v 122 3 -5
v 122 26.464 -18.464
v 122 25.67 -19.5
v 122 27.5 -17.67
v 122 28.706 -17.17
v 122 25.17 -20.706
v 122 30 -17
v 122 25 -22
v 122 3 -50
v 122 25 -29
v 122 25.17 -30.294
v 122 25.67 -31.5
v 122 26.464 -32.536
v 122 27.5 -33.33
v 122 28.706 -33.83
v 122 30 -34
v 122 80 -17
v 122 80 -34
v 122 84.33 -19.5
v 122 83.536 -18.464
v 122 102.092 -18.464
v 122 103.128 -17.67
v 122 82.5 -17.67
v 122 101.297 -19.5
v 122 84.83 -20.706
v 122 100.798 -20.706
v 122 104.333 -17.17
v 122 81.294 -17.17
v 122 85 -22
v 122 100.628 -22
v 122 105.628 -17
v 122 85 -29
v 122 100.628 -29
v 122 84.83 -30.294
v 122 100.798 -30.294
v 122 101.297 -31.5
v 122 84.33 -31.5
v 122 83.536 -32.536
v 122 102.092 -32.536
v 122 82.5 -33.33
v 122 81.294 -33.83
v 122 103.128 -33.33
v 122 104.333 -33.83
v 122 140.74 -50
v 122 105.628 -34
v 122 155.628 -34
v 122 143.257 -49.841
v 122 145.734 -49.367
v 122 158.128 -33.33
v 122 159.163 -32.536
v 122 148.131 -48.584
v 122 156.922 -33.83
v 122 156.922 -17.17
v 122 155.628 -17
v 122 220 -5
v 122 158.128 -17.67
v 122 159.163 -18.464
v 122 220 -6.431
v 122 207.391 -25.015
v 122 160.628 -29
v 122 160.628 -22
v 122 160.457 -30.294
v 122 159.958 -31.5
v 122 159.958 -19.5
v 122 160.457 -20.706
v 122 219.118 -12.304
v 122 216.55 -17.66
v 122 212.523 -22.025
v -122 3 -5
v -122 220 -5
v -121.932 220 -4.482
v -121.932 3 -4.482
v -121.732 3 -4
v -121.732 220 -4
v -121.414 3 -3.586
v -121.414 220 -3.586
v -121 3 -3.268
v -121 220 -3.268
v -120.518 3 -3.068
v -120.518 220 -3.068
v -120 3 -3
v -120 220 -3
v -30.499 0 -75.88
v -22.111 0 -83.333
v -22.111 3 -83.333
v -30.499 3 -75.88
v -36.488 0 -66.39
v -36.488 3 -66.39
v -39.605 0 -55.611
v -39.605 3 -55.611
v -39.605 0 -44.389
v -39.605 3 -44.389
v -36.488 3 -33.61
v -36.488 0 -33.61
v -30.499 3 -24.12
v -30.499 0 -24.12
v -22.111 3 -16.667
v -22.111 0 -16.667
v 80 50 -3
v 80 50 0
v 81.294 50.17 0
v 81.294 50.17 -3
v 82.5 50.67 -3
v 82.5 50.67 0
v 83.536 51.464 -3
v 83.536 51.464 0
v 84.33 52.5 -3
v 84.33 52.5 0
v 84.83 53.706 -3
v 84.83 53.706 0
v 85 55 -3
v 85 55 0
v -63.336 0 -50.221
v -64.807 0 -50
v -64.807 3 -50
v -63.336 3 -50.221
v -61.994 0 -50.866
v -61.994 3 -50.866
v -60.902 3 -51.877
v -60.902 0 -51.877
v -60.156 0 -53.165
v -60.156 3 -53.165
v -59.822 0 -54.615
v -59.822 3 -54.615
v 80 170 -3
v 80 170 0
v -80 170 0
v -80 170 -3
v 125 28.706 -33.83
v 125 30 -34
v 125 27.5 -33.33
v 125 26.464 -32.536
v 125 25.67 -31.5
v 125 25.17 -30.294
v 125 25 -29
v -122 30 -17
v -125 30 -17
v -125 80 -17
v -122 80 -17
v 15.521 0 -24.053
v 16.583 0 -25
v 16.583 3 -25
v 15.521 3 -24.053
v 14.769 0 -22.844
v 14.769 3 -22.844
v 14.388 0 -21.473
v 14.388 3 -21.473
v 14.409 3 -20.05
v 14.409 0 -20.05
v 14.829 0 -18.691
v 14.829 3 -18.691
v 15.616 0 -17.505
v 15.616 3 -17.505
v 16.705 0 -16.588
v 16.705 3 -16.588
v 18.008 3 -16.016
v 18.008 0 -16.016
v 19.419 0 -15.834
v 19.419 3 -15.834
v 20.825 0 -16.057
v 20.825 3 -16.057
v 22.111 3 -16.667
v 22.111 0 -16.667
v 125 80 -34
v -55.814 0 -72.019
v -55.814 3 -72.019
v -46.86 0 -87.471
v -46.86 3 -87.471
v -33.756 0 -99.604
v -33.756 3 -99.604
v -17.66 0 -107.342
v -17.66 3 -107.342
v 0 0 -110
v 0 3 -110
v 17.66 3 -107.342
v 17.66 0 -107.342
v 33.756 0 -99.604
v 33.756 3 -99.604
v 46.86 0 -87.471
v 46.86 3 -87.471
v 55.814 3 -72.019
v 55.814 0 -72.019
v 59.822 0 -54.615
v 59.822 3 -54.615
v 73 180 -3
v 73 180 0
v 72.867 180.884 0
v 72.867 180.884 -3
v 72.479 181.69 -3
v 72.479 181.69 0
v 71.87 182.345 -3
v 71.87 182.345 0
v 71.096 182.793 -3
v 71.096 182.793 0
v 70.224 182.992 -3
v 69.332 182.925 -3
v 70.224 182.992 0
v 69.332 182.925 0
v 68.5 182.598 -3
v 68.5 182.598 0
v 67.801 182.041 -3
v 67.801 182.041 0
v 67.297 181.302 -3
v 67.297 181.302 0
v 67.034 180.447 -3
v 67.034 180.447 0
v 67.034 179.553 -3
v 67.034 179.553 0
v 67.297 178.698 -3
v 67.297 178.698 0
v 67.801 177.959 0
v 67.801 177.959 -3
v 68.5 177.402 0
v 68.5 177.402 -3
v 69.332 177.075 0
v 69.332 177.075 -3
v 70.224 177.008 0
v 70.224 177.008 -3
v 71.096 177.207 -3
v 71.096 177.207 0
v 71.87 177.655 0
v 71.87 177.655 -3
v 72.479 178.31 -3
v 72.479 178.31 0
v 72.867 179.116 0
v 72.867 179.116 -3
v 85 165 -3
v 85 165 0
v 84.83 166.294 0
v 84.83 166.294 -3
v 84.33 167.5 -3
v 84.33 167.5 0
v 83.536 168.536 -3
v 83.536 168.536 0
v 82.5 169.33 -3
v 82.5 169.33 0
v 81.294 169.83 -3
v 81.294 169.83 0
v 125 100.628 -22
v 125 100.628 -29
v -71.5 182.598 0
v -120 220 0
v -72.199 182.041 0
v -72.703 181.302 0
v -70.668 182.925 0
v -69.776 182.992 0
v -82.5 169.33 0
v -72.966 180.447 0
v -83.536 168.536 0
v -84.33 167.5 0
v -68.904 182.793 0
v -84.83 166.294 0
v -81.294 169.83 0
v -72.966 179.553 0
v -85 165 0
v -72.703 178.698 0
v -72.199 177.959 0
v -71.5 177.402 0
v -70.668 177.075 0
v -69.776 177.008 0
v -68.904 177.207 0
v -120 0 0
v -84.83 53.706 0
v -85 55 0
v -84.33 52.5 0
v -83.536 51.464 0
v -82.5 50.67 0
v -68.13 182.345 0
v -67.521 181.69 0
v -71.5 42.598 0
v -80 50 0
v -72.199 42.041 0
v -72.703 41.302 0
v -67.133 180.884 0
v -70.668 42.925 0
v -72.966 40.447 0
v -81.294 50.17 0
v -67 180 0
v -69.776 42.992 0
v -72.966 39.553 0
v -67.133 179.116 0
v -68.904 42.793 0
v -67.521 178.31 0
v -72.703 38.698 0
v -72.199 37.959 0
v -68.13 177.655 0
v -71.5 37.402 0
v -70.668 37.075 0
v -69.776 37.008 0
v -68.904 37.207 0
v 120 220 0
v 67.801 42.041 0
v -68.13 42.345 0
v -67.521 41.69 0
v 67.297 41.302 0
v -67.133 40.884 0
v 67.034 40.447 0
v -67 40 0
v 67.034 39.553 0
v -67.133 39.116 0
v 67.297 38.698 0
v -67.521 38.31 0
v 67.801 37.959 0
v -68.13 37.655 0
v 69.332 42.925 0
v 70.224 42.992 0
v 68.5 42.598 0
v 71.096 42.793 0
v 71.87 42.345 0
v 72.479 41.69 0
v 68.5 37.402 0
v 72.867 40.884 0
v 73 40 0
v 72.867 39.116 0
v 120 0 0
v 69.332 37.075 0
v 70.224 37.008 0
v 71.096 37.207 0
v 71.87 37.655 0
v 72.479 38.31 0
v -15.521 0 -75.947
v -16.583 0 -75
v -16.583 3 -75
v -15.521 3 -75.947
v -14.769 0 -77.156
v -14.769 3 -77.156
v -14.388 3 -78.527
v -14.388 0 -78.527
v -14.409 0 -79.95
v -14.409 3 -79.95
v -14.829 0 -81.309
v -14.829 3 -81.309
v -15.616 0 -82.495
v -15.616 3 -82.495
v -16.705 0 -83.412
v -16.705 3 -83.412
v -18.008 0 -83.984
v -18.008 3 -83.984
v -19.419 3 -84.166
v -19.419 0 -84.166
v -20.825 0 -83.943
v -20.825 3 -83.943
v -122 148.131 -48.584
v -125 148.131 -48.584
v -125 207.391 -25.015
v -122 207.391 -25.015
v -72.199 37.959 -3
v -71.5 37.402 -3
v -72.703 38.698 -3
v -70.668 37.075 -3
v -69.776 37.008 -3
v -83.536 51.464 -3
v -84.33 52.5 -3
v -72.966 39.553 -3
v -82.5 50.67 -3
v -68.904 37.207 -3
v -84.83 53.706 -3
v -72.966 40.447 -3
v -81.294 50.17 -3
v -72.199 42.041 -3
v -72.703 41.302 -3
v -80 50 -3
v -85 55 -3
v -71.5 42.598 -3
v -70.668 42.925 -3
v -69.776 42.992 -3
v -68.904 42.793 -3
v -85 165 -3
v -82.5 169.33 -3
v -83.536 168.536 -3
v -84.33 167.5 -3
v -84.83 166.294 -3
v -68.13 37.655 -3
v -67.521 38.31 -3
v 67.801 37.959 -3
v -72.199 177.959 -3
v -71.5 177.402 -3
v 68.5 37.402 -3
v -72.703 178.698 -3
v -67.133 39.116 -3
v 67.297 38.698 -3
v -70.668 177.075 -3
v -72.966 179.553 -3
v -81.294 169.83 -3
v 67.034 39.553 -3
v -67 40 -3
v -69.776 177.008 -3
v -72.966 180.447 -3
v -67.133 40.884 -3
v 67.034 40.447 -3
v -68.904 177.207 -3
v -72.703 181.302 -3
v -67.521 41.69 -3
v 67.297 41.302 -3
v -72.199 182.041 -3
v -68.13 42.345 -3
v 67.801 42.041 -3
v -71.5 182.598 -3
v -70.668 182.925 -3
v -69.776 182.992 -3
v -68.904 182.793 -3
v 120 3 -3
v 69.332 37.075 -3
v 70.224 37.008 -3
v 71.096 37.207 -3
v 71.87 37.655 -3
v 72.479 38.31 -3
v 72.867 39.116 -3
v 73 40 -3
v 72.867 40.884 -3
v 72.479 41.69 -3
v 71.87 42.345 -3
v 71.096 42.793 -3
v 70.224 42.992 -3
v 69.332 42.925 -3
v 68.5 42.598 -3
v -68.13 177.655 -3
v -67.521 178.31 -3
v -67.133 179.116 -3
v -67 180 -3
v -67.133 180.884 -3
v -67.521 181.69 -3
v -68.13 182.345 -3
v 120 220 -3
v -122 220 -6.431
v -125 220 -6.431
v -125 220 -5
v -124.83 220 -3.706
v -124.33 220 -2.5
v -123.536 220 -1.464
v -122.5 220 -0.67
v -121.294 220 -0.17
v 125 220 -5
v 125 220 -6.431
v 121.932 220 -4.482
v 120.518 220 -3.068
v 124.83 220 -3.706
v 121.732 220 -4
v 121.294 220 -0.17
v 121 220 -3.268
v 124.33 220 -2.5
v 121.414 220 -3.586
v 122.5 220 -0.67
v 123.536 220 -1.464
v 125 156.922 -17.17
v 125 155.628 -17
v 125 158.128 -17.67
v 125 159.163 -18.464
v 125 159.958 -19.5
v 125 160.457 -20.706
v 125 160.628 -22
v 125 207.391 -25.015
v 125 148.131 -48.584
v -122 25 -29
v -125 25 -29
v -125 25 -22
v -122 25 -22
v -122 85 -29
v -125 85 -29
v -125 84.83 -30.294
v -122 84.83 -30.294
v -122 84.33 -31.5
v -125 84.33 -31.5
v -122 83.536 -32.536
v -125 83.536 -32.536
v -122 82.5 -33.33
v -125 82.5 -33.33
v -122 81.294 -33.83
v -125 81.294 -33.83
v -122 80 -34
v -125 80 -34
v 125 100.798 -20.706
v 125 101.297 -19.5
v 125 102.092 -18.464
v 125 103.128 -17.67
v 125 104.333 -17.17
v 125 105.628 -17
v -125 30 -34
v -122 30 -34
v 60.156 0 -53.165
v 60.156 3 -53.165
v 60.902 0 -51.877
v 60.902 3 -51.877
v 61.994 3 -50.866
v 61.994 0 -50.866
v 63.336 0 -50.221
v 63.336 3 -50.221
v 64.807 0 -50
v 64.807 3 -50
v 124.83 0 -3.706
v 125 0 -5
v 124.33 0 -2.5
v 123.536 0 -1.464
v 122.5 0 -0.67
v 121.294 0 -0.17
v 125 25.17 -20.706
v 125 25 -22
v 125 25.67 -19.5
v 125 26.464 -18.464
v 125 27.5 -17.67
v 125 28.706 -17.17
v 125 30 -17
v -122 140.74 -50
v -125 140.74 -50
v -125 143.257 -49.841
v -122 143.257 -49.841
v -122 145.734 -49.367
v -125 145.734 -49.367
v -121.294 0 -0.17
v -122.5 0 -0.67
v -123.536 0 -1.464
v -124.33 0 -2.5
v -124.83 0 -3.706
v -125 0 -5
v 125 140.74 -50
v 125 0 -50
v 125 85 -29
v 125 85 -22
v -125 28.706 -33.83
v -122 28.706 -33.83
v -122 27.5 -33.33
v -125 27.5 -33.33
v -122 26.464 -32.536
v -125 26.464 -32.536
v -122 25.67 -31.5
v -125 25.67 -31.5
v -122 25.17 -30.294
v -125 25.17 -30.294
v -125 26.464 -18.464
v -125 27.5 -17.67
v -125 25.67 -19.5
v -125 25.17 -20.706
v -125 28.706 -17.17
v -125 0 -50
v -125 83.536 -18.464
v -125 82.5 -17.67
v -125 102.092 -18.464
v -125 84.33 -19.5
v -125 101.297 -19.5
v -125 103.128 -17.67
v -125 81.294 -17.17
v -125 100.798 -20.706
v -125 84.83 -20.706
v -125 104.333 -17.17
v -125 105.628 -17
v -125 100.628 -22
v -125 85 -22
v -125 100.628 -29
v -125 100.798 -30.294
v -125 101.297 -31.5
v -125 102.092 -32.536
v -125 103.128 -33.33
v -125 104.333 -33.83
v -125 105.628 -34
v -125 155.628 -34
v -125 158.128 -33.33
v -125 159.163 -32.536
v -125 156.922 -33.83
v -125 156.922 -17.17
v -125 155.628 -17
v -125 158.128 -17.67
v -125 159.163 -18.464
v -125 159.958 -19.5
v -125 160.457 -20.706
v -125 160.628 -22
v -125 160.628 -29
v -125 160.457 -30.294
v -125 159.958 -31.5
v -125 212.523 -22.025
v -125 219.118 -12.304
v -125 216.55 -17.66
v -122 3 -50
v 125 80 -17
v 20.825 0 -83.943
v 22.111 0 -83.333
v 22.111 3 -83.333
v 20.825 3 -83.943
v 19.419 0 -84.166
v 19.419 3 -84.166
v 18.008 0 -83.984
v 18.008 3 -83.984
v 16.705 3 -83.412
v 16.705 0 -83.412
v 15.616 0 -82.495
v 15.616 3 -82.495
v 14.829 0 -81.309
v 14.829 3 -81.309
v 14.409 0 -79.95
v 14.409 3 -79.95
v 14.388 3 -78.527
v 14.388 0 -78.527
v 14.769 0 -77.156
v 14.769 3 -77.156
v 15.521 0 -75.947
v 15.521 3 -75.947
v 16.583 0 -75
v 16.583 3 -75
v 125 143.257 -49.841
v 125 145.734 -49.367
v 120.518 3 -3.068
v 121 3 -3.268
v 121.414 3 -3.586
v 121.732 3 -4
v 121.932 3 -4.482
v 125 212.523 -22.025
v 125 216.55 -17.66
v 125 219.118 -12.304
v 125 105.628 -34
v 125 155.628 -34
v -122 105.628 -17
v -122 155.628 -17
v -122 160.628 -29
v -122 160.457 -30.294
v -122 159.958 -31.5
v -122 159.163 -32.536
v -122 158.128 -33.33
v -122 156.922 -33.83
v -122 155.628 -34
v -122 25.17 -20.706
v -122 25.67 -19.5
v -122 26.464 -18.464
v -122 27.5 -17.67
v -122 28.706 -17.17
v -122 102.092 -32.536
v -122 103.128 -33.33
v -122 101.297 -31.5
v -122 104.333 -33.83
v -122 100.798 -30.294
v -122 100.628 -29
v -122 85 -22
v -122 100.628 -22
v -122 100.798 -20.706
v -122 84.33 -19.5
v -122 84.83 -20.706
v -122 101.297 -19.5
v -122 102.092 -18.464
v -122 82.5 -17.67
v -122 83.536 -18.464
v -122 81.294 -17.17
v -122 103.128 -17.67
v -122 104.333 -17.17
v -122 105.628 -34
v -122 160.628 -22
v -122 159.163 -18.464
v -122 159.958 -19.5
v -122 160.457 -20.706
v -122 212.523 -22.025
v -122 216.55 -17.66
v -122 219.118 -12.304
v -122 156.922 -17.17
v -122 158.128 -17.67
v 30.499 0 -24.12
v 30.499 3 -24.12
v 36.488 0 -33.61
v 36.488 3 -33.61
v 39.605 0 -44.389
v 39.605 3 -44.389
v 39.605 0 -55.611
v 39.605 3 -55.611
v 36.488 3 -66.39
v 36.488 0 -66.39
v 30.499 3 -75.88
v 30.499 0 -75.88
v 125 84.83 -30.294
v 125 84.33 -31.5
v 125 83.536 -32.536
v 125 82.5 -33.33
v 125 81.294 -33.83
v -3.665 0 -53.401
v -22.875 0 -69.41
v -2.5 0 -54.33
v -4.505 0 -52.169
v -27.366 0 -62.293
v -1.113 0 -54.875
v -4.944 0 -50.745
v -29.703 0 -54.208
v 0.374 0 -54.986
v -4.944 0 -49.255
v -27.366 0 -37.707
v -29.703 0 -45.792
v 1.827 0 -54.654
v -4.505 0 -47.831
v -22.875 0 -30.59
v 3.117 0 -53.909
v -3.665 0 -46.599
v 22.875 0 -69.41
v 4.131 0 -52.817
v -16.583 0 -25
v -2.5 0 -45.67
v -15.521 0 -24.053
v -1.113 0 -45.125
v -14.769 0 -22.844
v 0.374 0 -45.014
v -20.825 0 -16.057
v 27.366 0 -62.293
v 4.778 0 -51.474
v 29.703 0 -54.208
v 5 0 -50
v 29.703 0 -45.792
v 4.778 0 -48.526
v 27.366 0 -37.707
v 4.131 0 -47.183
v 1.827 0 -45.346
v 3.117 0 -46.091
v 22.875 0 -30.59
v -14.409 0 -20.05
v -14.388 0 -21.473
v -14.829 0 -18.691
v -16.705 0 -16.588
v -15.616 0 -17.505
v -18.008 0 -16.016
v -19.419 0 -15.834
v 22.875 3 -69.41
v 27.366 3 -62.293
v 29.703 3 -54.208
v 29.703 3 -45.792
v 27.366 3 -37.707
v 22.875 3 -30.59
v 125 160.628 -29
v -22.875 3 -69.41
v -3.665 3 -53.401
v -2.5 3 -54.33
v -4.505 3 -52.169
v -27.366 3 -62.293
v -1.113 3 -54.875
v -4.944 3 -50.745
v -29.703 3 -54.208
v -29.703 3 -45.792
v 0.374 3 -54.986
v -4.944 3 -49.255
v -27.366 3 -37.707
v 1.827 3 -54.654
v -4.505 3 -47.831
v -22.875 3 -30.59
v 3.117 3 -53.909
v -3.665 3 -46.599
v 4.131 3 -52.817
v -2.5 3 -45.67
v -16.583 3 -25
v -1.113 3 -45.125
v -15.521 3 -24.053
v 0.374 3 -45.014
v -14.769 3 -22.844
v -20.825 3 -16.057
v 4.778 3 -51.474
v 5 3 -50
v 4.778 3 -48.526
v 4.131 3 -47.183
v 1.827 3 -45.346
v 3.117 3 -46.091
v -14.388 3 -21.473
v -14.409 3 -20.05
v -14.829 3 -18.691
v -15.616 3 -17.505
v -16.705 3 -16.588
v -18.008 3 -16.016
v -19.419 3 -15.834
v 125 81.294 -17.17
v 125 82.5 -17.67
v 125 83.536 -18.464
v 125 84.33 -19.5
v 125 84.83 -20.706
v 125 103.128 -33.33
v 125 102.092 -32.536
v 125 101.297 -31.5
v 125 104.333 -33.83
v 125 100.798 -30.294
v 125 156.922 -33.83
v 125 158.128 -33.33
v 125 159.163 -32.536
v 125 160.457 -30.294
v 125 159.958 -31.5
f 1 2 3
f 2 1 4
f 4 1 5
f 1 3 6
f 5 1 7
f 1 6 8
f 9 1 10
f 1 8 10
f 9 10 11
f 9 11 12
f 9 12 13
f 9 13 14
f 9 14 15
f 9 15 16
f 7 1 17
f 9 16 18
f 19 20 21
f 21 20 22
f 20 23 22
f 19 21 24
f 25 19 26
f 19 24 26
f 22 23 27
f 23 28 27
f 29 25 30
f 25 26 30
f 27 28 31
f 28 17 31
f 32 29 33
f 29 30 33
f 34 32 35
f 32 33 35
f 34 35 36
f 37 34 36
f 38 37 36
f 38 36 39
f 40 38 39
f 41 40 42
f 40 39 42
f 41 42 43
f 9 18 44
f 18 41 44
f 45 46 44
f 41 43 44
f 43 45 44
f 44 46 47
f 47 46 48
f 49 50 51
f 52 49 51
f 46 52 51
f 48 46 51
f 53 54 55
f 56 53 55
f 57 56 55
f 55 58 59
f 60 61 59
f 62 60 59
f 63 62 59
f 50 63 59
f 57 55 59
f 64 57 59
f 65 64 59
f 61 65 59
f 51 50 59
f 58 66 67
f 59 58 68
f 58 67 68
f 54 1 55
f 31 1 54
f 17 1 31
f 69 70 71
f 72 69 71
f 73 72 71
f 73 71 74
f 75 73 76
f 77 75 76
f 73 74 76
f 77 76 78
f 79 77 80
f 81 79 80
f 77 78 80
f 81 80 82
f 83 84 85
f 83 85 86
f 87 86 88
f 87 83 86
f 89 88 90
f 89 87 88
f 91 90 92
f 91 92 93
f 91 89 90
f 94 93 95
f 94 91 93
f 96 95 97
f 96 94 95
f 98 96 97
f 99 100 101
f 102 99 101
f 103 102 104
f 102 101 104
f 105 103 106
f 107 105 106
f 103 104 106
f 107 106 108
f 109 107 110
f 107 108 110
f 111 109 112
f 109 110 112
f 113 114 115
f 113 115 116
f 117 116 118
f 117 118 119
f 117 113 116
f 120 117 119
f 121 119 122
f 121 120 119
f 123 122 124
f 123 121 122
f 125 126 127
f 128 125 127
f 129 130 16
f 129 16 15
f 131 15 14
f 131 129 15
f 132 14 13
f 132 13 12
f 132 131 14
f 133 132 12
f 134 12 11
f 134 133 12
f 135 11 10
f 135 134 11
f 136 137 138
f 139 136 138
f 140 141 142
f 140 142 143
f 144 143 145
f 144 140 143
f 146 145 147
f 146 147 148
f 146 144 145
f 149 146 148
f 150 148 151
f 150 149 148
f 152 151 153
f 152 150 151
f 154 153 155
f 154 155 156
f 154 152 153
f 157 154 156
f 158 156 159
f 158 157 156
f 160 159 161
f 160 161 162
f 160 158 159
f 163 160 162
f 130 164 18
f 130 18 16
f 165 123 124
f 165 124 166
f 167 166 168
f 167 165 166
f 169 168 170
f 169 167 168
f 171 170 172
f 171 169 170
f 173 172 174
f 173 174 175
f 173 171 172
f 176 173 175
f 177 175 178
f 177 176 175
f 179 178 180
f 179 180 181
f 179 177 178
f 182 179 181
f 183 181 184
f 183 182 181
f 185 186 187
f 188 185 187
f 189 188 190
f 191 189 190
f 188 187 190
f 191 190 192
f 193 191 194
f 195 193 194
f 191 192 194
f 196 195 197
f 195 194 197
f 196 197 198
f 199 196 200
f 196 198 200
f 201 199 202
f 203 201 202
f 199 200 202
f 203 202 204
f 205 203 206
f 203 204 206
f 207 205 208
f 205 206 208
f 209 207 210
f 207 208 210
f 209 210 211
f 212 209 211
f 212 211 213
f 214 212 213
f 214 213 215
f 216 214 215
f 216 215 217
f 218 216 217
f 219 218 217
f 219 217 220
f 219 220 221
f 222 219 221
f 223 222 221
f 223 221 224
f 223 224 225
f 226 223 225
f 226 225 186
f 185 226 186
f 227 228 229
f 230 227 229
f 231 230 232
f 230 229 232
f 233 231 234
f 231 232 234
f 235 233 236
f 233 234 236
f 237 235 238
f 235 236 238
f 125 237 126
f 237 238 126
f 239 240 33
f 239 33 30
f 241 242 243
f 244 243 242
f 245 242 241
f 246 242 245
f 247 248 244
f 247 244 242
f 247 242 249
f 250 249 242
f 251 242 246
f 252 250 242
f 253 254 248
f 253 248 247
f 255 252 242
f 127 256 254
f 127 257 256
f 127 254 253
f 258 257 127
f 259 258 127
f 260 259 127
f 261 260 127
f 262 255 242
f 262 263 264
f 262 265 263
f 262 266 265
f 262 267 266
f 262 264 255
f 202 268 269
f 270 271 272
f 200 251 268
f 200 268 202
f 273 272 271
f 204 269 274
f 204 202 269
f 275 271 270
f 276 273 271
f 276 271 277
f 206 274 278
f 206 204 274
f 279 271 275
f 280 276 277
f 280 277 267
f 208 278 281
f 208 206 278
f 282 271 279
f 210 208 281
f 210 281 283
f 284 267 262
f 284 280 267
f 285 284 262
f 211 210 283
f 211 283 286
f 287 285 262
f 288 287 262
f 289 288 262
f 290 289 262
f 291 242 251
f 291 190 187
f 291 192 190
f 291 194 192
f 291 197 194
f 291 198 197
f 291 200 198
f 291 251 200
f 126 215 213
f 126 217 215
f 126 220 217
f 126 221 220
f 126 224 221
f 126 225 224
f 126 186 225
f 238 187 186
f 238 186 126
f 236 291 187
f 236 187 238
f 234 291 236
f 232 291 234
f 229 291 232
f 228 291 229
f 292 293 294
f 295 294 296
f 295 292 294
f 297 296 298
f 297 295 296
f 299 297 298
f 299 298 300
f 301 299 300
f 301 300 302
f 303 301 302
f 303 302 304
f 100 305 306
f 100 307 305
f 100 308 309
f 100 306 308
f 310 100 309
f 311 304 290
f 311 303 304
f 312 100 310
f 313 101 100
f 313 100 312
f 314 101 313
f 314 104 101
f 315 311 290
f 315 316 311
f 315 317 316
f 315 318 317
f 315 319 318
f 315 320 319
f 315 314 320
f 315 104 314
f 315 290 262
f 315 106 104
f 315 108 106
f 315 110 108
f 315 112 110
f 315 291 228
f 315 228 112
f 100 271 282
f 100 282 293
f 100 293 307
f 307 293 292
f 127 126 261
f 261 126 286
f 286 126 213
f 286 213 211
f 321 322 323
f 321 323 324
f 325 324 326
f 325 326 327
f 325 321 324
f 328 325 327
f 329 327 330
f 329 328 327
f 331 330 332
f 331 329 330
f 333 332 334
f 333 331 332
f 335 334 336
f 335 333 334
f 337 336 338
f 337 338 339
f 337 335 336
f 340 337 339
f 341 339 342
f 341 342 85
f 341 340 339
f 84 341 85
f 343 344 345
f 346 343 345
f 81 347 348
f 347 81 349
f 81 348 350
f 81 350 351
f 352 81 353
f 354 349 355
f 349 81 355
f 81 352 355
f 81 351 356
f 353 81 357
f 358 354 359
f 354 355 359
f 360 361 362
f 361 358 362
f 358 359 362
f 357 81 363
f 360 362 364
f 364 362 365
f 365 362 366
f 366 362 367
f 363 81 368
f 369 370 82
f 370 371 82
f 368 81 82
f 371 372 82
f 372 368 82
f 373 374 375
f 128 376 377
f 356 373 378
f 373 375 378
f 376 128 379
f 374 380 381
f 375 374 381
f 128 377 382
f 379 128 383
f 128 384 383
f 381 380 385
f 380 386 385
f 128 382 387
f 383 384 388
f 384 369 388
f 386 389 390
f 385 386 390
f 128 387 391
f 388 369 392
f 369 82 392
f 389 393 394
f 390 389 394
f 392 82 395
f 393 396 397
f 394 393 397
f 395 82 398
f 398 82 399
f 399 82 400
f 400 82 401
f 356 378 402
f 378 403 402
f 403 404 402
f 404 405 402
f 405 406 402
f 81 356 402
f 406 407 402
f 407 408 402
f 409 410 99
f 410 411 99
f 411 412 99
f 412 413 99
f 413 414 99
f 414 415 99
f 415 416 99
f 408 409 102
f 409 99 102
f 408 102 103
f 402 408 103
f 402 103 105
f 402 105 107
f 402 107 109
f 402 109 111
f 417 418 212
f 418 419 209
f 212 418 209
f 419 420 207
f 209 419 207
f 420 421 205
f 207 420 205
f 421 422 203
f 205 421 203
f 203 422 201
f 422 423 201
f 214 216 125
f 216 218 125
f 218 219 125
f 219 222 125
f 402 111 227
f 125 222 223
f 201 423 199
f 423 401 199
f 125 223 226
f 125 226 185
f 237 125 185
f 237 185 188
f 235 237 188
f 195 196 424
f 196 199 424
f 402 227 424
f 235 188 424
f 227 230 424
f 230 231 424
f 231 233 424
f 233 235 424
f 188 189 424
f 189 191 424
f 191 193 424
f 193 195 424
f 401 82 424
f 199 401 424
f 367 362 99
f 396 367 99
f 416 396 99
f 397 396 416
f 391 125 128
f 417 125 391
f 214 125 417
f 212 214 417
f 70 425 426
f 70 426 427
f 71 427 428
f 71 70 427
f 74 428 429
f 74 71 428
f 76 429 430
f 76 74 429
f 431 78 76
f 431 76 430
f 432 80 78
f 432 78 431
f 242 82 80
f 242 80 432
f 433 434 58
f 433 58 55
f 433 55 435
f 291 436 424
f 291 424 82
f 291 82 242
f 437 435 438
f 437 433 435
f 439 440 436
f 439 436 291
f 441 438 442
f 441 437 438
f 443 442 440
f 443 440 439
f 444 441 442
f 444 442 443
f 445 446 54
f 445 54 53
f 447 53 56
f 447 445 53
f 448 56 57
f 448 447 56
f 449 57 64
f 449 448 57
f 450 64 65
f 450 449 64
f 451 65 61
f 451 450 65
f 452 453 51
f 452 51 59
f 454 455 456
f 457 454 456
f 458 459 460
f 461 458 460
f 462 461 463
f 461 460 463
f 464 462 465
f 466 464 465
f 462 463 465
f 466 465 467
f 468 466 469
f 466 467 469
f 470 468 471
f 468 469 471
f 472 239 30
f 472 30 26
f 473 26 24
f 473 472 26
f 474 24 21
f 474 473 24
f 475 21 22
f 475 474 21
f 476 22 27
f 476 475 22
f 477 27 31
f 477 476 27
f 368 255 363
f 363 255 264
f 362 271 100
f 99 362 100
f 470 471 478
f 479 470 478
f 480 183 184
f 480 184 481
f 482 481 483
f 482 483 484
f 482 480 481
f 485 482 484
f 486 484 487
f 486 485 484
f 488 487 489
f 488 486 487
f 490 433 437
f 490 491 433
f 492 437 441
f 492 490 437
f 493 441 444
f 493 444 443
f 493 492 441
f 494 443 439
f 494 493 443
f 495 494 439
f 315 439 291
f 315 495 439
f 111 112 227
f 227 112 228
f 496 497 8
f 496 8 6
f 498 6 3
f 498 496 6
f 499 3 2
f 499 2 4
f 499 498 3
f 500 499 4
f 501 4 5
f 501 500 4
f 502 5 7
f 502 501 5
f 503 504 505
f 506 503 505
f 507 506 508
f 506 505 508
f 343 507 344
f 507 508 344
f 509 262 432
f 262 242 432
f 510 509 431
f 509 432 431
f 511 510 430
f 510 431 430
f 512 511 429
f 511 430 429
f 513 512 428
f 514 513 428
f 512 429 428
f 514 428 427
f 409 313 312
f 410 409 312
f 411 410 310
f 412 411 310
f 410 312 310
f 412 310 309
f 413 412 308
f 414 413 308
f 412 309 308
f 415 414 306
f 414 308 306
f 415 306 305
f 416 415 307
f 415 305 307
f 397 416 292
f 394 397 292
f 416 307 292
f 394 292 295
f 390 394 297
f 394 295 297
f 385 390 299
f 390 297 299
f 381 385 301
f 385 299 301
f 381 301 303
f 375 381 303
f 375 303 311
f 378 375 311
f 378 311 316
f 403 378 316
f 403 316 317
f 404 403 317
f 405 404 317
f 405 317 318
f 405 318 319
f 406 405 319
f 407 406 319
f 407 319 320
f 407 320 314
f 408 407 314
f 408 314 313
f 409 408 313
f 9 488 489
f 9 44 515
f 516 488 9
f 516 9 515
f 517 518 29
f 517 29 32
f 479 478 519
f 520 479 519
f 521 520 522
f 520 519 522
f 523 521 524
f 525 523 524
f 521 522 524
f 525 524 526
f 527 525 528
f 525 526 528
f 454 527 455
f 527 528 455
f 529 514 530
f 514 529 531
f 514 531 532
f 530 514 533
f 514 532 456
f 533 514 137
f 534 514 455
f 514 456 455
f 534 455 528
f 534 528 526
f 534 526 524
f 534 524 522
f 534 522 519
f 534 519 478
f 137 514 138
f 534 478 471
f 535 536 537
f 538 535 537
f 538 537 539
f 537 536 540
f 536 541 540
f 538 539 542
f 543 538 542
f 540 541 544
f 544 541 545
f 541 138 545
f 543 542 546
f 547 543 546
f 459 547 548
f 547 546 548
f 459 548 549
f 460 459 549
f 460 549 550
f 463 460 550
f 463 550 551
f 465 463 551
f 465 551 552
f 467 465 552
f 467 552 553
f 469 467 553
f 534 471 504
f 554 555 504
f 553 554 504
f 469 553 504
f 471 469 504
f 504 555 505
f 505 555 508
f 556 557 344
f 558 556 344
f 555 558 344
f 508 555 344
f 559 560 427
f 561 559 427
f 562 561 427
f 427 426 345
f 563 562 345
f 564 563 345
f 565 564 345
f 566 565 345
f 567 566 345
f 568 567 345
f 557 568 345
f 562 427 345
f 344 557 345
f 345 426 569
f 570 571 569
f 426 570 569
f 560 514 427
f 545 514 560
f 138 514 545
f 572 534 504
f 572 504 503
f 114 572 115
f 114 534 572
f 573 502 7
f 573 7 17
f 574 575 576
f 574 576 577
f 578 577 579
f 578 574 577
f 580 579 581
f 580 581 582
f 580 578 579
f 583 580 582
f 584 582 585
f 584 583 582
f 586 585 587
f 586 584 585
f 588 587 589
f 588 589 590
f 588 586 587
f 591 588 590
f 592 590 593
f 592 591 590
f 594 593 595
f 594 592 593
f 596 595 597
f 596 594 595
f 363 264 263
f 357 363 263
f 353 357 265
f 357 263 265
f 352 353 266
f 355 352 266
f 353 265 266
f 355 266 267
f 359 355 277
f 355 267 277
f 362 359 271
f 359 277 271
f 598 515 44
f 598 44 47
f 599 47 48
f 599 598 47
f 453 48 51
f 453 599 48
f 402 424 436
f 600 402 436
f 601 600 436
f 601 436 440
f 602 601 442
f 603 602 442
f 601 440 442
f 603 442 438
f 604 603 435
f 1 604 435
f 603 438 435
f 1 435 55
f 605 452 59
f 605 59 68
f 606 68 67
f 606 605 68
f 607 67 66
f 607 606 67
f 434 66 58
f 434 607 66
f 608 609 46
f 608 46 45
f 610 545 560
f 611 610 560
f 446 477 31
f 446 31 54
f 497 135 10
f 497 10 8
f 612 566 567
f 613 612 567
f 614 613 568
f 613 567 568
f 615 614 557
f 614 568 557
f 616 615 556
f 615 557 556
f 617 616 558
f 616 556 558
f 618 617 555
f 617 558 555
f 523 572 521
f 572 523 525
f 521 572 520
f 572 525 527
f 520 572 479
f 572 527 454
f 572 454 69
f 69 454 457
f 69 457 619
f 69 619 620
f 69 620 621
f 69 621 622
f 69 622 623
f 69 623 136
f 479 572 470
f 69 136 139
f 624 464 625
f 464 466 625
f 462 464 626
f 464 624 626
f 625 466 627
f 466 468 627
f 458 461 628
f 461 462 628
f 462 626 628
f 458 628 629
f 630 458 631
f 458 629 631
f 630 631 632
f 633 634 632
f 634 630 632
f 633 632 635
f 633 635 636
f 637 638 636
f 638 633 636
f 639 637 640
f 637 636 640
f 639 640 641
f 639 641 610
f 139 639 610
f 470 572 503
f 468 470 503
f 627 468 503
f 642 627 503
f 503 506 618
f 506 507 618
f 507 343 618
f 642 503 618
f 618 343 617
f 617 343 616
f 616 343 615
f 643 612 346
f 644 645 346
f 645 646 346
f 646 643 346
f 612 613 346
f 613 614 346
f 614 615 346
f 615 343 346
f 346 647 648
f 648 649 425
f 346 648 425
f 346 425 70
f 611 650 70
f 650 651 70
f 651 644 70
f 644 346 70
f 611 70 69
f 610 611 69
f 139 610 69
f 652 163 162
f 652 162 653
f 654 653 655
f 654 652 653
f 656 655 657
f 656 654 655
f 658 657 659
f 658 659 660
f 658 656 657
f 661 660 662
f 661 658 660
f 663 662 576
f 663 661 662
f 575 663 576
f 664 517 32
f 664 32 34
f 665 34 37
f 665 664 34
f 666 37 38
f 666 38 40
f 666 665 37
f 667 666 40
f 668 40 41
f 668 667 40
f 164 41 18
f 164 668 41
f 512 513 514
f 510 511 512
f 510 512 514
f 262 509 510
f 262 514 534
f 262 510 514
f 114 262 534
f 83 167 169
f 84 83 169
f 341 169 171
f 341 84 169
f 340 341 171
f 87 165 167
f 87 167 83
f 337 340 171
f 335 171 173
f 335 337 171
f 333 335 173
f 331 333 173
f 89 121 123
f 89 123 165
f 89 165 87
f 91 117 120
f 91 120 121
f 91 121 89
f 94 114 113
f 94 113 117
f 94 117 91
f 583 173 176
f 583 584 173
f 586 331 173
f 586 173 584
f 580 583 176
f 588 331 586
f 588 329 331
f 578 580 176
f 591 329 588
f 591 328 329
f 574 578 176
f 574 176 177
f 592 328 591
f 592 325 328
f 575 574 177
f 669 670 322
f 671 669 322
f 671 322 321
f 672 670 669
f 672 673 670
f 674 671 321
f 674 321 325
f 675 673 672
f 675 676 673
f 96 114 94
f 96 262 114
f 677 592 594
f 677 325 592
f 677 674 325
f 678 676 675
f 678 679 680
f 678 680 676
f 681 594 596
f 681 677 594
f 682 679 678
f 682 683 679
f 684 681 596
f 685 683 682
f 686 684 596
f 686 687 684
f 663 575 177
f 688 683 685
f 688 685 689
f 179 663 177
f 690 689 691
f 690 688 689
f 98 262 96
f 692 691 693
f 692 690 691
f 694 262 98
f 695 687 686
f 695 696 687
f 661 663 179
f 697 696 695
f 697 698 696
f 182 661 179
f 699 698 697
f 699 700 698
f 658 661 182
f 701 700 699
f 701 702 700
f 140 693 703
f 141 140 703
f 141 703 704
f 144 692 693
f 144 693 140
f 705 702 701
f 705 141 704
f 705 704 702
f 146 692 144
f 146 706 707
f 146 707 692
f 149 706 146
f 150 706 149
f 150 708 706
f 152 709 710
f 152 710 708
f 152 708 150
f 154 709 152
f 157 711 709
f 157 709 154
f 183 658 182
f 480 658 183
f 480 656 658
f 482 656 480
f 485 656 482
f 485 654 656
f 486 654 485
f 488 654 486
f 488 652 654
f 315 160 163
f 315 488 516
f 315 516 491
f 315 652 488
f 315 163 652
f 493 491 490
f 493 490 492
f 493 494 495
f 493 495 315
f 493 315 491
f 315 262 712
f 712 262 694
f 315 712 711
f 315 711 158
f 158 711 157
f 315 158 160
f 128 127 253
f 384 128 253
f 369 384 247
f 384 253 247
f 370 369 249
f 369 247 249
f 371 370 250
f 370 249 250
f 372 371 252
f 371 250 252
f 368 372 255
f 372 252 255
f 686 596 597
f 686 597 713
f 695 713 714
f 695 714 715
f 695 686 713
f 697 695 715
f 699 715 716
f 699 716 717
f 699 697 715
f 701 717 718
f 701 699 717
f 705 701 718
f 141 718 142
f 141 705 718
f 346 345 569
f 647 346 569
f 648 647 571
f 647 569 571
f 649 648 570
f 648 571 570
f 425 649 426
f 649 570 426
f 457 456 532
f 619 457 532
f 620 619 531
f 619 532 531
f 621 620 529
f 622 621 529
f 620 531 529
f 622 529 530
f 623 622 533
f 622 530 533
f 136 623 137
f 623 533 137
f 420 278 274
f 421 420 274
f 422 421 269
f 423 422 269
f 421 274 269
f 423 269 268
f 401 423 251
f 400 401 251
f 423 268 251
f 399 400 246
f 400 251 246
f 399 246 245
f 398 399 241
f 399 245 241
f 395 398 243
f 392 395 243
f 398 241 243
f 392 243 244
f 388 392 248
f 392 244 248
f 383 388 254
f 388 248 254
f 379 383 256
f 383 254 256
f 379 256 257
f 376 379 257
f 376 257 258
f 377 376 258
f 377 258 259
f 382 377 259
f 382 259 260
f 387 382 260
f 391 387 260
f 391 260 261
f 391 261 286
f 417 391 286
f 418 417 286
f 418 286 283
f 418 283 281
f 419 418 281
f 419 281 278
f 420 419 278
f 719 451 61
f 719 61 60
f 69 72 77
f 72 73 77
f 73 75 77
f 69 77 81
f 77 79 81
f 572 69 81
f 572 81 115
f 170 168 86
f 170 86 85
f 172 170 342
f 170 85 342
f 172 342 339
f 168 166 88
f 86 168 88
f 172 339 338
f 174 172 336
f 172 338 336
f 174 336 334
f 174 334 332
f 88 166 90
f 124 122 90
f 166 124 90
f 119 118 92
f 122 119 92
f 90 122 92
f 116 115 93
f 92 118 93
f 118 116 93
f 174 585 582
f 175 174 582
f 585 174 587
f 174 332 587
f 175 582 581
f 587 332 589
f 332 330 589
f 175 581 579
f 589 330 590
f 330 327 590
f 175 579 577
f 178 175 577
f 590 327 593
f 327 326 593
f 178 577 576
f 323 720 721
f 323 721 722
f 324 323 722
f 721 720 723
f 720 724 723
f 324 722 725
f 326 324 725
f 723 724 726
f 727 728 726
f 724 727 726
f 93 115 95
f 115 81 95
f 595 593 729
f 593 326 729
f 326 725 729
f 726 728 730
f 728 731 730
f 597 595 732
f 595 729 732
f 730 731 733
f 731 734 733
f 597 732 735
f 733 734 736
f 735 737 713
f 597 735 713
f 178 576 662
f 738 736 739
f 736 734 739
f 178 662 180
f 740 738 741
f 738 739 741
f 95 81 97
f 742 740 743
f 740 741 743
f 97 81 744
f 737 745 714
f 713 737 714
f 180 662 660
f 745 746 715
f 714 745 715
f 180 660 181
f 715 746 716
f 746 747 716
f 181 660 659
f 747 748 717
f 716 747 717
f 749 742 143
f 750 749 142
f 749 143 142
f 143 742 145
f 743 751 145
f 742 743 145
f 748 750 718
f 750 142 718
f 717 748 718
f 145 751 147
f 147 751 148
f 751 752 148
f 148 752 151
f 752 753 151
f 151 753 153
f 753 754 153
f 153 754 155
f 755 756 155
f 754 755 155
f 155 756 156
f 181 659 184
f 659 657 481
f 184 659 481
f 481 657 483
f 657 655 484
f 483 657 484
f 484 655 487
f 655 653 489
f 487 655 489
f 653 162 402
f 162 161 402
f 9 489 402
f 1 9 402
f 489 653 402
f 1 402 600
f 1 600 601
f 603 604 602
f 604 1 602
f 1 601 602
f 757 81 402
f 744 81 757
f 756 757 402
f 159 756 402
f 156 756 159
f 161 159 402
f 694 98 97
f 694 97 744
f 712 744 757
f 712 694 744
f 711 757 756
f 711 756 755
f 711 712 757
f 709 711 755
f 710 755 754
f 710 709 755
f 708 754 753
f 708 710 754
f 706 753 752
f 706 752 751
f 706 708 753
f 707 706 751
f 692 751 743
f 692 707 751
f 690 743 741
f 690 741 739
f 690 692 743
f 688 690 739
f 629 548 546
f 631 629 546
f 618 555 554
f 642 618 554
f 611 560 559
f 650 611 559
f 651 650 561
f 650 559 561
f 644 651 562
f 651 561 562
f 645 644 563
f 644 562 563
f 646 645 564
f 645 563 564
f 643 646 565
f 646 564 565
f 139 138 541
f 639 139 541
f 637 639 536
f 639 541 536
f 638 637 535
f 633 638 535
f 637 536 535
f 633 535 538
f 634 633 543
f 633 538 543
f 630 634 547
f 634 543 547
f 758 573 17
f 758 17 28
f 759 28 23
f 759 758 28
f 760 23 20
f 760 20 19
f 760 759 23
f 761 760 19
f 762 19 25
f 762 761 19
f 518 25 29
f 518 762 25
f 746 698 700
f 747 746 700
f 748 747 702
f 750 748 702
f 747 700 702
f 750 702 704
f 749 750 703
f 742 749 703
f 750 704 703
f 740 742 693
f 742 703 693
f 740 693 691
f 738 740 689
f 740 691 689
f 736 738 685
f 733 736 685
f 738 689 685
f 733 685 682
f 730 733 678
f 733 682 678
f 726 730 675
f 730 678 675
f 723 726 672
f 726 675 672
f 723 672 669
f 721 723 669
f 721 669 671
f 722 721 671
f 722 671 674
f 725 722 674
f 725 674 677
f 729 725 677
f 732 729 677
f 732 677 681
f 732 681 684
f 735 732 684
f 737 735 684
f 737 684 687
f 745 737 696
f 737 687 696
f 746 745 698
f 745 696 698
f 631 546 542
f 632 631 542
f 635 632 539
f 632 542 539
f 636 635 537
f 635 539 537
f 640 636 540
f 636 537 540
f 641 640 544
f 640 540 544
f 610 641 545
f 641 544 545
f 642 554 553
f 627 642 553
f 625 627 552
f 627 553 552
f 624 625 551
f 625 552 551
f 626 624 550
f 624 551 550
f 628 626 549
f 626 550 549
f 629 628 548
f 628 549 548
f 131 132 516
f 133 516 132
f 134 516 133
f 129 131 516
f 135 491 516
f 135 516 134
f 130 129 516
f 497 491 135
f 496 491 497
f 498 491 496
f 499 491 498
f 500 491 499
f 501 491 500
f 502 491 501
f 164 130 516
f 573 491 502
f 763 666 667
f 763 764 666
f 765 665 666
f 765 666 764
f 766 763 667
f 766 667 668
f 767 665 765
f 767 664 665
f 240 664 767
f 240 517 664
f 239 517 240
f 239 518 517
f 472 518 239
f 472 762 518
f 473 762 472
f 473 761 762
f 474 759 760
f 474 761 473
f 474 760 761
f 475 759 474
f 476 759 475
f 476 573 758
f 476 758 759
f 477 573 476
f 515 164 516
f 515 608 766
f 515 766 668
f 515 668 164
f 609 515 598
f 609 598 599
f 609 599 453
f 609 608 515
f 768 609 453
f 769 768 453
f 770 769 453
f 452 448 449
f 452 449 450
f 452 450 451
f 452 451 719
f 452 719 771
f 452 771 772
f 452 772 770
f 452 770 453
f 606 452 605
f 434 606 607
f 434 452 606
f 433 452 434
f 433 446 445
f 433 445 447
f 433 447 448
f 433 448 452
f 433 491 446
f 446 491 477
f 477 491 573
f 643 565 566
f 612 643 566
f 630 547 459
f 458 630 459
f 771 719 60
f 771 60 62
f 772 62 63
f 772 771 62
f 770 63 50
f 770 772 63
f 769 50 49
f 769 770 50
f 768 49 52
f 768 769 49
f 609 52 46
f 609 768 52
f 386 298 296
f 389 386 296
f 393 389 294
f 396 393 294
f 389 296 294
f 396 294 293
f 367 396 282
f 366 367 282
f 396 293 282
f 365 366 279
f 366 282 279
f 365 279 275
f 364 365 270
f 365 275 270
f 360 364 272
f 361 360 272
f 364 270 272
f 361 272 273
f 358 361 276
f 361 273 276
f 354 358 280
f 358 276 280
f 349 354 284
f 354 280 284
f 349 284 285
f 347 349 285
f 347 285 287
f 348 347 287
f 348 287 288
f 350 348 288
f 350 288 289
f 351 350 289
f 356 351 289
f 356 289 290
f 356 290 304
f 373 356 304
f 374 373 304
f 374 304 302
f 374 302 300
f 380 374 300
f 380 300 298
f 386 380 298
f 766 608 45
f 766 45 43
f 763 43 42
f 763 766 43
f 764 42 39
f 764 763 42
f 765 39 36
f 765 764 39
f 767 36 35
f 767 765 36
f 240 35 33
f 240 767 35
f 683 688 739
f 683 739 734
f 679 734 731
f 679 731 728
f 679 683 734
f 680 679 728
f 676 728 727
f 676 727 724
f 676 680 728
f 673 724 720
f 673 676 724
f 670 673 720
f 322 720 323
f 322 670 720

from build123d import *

# Parameters (mm, degrees)
F7_DEPTH  = 220
F8_DEPTH  = 3
F9_DEPTH  = 3
F0_R      = 5
F10_DEPTH = 3
F11_R     = 5
F12_R     = 5
F13_R     = 3
F14_DEPTH = 25


with BuildPart() as f7:
    # F4 (on offset) → F7 (new body)
    with BuildSketch(Plane.XZ.offset(-220)):
        with BuildLine():
            Line((125, -6.430699), (125, -2))
            ThreePointArc((125, -2), (124.414214, -0.585786), (123, 0))
            Line((123, 0), (-123, 0))
            ThreePointArc((-123, 0), (-124.414214, -0.585786), (-125, -2))
            Line((-125, -2), (-125, -6.430699))
            Line((-125, -6.430699), (-122, -6.430699))
            Line((-122, -6.430699), (-122, -5))
            ThreePointArc((-122, -5), (-121.414214, -3.585786), (-120, -3))
            Line((-120, -3), (120, -3))
            ThreePointArc((120, -3), (121.414214, -3.585786), (122, -5))
            Line((122, -5), (122, -6.430699))
            Line((122, -6.430699), (125, -6.430699))
        make_face()
    extrude(amount=F7_DEPTH)

    # F6 (on offset) → F8 (join)
    with BuildSketch(Plane.YZ.offset(-125)):
        with BuildLine():
            Line((220, -6.430699), (220, 0))
            Line((220, 0), (0, 0))
            Line((0, 0), (0, -50))
            Line((0, -50), (140.739724, -50))
            ThreePointArc((140.739724, -50), (144.5026, -49.64283), (148.131078, -48.584076))
            Line((148.131078, -48.584076), (207.391354, -25.014775))
            ThreePointArc((207.391354, -25.014775), (216.550334, -17.659522), (220, -6.430699))
        make_face()
        with BuildLine():
            ThreePointArc((25, -22), (26.464466, -18.464466), (30, -17))
            Line((30, -17), (80, -17))
            ThreePointArc((80, -17), (83.535534, -18.464466), (85, -22))
            Line((85, -22), (85, -29))
            ThreePointArc((85, -29), (83.535534, -32.535534), (80, -34))
            Line((80, -34), (30, -34))
            ThreePointArc((30, -34), (26.464466, -32.535534), (25, -29))
            Line((25, -29), (25, -22))
        make_face(mode=Mode.SUBTRACT)
        with BuildLine():
            ThreePointArc((100.627564, -22), (102.09203, -18.464466), (105.627564, -17))
            Line((105.627564, -17), (155.627564, -17))
            ThreePointArc((155.627564, -17), (159.163098, -18.464466), (160.627564, -22))
            Line((160.627564, -22), (160.627564, -29))
            ThreePointArc((160.627564, -29), (159.163098, -32.535534), (155.627564, -34))
            Line((155.627564, -34), (105.627564, -34))
            ThreePointArc((105.627564, -34), (102.09203, -32.535534), (100.627564, -29))
            Line((100.627564, -29), (100.627564, -22))
        make_face(mode=Mode.SUBTRACT)
    extrude(amount=F8_DEPTH)

    # F2 (on offset) → F9 (join)
    with BuildSketch(Plane.YZ.offset(125)):
        with BuildLine():
            Line((220, 0), (0, 0))
            Line((0, 0), (0, -50))
            Line((0, -50), (140.739724, -50))
            ThreePointArc((140.739724, -50), (144.5026, -49.64283), (148.131078, -48.584076))
            Line((148.131078, -48.584076), (207.391354, -25.014775))
            ThreePointArc((207.391354, -25.014775), (216.550334, -17.659522), (220, -6.430699))
            Line((220, -6.430699), (220, 0))
        make_face()
        with BuildLine():
            ThreePointArc((25, -22), (26.464466, -18.464466), (30, -17))
            Line((30, -17), (80, -17))
            ThreePointArc((80, -17), (83.535534, -18.464466), (85, -22))
            Line((85, -22), (85, -29))
            ThreePointArc((85, -29), (83.535534, -32.535534), (80, -34))
            Line((80, -34), (30, -34))
            ThreePointArc((30, -34), (26.464466, -32.535534), (25, -29))
            Line((25, -29), (25, -22))
        make_face(mode=Mode.SUBTRACT)
        with BuildLine():
            ThreePointArc((100.627564, -22), (102.09203, -18.464466), (105.627564, -17))
            Line((105.627564, -17), (155.627564, -17))
            ThreePointArc((155.627564, -17), (159.163098, -18.464466), (160.627564, -22))
            Line((160.627564, -22), (160.627564, -29))
            ThreePointArc((160.627564, -29), (159.163098, -32.535534), (155.627564, -34))
            Line((155.627564, -34), (105.627564, -34))
            ThreePointArc((105.627564, -34), (102.09203, -32.535534), (100.627564, -29))
            Line((100.627564, -29), (100.627564, -22))
        make_face(mode=Mode.SUBTRACT)
    extrude(amount=-F9_DEPTH)

    # F0 (on Front) → F10 (join)
    with BuildSketch(Plane.XZ):
        with BuildLine():
            ThreePointArc((-64.807407, -50), (-61.410576, -51.331003), (-59.822222, -54.615385))
            ThreePointArc((-59.822222, -54.615385), (0, -110), (59.822222, -54.615385))
            ThreePointArc((59.822222, -54.615385), (61.410576, -51.331003), (64.807407, -50))
            Line((64.807407, -50), (125, -50))
            Line((125, -50), (125, 0))
            Line((125, 0), (-125, 0))
            Line((-125, 0), (-125, -50))
            Line((-125, -50), (-64.807407, -50))
        make_face()
        with BuildLine():
            ThreePointArc((-16.583124, -25), (-30, -50), (-16.583124, -75))
            ThreePointArc((-16.583124, -75), (-15.180311, -81.930521), (-22.110832, -83.333333))
            ThreePointArc((-22.110832, -83.333333), (-40, -50), (-22.110832, -16.666667))
            ThreePointArc((-22.110832, -16.666667), (-15.180311, -18.069479), (-16.583124, -25))
        make_face(mode=Mode.SUBTRACT)
        with Locations((0, -50)):
            Circle(F0_R, mode=Mode.SUBTRACT)
        with BuildLine():
            ThreePointArc((22.110832, -83.333333), (15.180311, -81.930521), (16.583124, -75))
            ThreePointArc((16.583124, -75), (30, -50), (16.583124, -25))
            ThreePointArc((16.583124, -25), (15.180311, -18.069479), (22.110832, -16.666667))
            ThreePointArc((22.110832, -16.666667), (40, -50), (22.110832, -83.333333))
        make_face(mode=Mode.SUBTRACT)
    extrude(amount=-F10_DEPTH)

    # F11
    f11_edges = [f7.edges().sort_by_distance(p)[0] for p in [
        (125, 110, 0),
    ]]
    fillet(f11_edges, radius=F11_R)

    # F12
    f12_edges = [f7.edges().sort_by_distance(p)[0] for p in [
        (-125, 110, 0),
    ]]
    fillet(f12_edges, radius=F12_R)

    # F13 (on face) → F14 (cut)
    with BuildSketch(Plane.XY):
        with BuildLine():
            Line((-80, 50), (80, 50))
            ThreePointArc((80, 50), (83.535534, 51.464466), (85, 55))
            Line((85, 55), (85, 165))
            ThreePointArc((85, 165), (83.535534, 168.535534), (80, 170))
            Line((80, 170), (-80, 170))
            ThreePointArc((-80, 170), (-83.535534, 168.535534), (-85, 165))
            Line((-85, 165), (-85, 55))
            ThreePointArc((-85, 55), (-83.535534, 51.464466), (-80, 50))
        make_face()
        with Locations((-70, 180)):
            Circle(F13_R)
        with Locations((-70, 40)):
            Circle(F13_R)
        with Locations((70, 40)):
            Circle(F13_R)
        with Locations((70, 180)):
            Circle(F13_R)
    extrude(amount=-F14_DEPTH, mode=Mode.SUBTRACT)


solid = f7.part
